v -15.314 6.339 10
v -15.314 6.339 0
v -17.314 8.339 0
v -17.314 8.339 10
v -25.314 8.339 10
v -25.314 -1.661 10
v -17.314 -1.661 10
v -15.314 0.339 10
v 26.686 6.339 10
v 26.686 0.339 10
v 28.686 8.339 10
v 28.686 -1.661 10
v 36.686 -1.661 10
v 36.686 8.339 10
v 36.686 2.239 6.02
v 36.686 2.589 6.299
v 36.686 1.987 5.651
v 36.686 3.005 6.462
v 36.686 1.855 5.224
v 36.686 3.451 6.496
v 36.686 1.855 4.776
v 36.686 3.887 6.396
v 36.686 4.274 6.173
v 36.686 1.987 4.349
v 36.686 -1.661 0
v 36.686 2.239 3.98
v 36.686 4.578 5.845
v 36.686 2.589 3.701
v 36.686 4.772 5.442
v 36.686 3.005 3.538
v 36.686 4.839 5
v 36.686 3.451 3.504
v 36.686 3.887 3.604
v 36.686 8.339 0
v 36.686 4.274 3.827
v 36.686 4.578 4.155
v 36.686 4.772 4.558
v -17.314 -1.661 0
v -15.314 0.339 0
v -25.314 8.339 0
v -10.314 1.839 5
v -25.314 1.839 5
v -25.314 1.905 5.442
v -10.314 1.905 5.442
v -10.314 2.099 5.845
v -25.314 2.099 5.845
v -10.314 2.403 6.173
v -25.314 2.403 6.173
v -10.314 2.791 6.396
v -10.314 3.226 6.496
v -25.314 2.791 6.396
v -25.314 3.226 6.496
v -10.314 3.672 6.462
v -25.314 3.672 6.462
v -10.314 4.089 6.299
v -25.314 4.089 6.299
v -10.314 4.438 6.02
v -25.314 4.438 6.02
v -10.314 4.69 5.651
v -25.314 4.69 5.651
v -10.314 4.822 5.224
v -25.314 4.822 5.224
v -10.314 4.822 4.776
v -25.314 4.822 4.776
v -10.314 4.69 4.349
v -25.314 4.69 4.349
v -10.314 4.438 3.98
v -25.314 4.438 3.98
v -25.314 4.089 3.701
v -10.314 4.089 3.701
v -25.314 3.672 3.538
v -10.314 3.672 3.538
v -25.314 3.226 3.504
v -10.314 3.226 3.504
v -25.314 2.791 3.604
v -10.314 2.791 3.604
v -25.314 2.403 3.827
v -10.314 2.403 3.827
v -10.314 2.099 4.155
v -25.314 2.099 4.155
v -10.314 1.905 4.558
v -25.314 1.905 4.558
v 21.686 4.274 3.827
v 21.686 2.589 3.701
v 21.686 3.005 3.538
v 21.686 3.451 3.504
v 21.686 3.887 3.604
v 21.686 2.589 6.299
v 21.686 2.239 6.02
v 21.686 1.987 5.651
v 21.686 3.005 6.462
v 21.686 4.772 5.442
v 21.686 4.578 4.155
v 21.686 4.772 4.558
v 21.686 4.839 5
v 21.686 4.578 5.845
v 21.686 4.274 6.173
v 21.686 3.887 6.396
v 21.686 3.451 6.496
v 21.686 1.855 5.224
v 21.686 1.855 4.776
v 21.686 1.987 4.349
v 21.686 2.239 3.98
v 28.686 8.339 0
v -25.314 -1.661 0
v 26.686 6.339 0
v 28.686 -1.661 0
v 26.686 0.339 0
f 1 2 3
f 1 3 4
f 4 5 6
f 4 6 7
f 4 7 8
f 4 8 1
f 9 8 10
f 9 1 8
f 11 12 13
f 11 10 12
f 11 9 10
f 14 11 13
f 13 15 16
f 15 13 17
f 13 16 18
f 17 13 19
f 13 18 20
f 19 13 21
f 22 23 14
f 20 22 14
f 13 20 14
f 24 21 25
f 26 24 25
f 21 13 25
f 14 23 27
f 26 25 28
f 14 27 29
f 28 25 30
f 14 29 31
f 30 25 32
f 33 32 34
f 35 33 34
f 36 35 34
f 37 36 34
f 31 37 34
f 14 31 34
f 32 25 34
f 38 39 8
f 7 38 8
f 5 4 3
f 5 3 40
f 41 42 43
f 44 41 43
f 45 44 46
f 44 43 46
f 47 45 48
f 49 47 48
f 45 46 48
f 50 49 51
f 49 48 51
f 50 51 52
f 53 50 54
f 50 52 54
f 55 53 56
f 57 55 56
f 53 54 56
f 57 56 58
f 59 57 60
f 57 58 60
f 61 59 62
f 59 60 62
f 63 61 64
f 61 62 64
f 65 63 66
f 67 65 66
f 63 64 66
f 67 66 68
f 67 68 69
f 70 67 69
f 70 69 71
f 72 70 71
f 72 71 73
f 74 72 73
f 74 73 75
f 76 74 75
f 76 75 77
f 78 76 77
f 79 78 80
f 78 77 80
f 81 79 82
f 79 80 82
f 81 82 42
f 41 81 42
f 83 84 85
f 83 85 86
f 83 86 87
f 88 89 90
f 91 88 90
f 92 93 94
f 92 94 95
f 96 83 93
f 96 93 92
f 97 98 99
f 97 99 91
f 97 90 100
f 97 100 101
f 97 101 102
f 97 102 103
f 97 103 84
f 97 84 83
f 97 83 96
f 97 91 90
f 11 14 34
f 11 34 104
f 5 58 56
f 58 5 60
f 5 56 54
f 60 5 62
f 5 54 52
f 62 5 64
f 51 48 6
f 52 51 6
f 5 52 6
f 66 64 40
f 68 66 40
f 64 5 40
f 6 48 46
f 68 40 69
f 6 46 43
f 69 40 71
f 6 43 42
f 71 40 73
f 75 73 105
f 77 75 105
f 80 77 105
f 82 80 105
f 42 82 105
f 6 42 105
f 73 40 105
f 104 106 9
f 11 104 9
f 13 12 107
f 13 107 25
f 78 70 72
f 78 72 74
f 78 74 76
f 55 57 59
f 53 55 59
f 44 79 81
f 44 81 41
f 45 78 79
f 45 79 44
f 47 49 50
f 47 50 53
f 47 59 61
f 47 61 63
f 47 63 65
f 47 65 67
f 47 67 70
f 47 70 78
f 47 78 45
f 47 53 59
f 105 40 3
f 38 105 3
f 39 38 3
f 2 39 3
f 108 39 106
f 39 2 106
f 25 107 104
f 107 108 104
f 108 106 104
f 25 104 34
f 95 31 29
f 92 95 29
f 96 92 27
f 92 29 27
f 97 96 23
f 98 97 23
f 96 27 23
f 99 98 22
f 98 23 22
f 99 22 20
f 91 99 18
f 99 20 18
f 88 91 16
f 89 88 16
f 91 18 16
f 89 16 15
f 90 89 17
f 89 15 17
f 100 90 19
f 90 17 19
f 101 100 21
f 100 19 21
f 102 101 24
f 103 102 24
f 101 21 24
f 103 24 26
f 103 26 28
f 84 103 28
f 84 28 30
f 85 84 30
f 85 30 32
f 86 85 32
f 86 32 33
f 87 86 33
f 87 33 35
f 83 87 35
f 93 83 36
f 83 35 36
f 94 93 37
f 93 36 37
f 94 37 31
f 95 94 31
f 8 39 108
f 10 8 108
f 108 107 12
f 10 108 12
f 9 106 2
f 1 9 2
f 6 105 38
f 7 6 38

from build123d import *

# Parameters (mm, degrees)
F1_DEPTH = 10
F2_SIZE  = 1.99999
F3_R     = 1.5
F4_DEPTH = 15
F5_R     = 1.5
F6_DEPTH = 15


# Not quite as in the source:
# - a fillet or chamfer is up to 0.001 mm smaller than in the source, because OpenCascade refuses the exact size


with BuildPart() as f1:
    # F0 (on Top) → F1 (new body)
    with BuildSketch(Plane.XY):
        Polygon((-15.3143769915, 8.338528797), (-25.3143769915, 8.338528797), (-25.3143769915, -1.661471203), (-15.3143769915, -1.661471203), (-15.3143769915, 0.338528797), (26.6856230085, 0.338528797), (26.6856230085, -1.661471203), (36.6856230085, -1.661471203), (36.6856230085, 8.338528797), (26.6856230085, 8.338528797), (26.6856230085, 6.338528797), (-15.3143769915, 6.338528797), align=None)
    extrude(amount=F1_DEPTH)

    # F2 (size 2 in the source; OpenCascade refuses exactly that, so slightly less here)
    f2_edges = [f1.edges().sort_by_distance(p)[0] for p in [
        (-15.314377, 8.338529, 5),
        (26.685623, 8.338529, 5),
        (-15.314377, -1.661471, 5),
        (26.685623, -1.661471, 5),
    ]]
    chamfer(f2_edges, length=F2_SIZE)

    # F3 (on face) → F4 (cut)
    with BuildSketch(Plane.YZ.offset(36.6856230085)):
        with Locations((3.338528797, 5)):
            Circle(F3_R)
    extrude(amount=-F4_DEPTH, mode=Mode.SUBTRACT)

    # F5 (on face) → F6 (cut)
    with BuildSketch(Plane(origin=(-25.3143769915, 0, 0), x_dir=(0, -1, 0), z_dir=(-1, 0, 0))):
        with Locations((-3.338528797, 5)):
            Circle(F5_R)
    extrude(amount=-F6_DEPTH, mode=Mode.SUBTRACT)


solid = f1.part
